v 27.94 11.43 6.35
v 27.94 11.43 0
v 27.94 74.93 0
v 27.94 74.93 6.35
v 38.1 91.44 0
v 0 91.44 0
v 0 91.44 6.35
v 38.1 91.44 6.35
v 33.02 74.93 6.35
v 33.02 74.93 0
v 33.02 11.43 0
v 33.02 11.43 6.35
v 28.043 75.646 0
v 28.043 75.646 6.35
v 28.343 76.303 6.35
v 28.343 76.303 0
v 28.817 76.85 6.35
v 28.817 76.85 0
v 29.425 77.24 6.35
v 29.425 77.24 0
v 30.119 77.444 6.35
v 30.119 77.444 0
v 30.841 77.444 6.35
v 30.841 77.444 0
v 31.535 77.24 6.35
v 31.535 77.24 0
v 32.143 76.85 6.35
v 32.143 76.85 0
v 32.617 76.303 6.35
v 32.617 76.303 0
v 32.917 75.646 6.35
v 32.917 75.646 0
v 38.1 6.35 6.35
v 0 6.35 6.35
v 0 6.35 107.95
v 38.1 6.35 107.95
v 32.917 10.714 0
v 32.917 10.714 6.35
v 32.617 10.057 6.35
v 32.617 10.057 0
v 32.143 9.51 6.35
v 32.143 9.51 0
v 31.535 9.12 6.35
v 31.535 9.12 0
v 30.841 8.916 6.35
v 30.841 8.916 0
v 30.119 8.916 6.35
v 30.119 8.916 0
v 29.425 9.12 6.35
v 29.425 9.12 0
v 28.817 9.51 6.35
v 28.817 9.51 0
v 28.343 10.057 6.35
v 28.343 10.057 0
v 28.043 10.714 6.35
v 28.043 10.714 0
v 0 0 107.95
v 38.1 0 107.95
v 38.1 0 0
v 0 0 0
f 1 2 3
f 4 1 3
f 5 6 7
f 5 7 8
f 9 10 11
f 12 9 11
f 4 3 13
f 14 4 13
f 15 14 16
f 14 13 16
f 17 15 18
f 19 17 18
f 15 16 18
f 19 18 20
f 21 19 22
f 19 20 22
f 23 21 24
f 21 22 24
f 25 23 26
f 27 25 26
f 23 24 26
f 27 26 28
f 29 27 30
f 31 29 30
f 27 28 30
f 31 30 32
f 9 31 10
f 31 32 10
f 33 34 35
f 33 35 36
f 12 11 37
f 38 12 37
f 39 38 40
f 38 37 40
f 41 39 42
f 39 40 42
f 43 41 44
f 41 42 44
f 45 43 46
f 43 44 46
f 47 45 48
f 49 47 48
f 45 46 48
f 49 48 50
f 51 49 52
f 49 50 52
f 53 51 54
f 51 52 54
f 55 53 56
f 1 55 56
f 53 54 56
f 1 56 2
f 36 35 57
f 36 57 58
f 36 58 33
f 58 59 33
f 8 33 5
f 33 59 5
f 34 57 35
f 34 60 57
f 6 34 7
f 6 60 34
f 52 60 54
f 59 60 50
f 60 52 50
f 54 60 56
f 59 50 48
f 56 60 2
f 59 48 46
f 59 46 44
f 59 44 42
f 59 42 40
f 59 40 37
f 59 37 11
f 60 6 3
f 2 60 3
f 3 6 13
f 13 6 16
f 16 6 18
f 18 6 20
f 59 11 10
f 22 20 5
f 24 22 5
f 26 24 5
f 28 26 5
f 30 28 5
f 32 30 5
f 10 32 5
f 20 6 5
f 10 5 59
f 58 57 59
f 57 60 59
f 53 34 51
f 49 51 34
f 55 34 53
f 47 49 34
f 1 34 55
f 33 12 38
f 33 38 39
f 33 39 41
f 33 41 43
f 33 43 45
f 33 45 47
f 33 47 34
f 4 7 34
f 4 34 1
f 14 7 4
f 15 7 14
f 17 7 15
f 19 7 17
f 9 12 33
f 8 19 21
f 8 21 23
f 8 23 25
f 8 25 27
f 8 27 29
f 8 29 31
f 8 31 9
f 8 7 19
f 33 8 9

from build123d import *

# Parameters (mm, degrees)
SKETCH1_W           = 38.1
SKETCH1_H           = 91.44
BOSS_EXTRUDE1_DEPTH = 6.35
SKETCH2_W           = 38.1
SKETCH2_H           = 6.35
BOSS_EXTRUDE2_DEPTH = 101.6


with BuildPart() as part:
    # Sketch1 → Boss-Extrude1 (new body)
    with BuildSketch(Plane.XY):
        with Locations((19.05, 45.72)):
            Rectangle(SKETCH1_W, SKETCH1_H)
        with BuildLine():
            Line((33.02, 74.93), (33.02, 11.43))
            ThreePointArc((33.02, 11.43), (30.48, 8.89), (27.94, 11.43))
            Line((27.94, 11.43), (27.94, 74.93))
            ThreePointArc((27.94, 74.93), (30.48, 77.47), (33.02, 74.93))
        make_face(mode=Mode.SUBTRACT)
    extrude(amount=BOSS_EXTRUDE1_DEPTH)

    # Sketch2 → Boss-Extrude2 (add)
    with BuildSketch(Plane.XY.offset(6.35)):
        with Locations((19.05, 3.175)):
            Rectangle(SKETCH2_W, SKETCH2_H)
    extrude(amount=BOSS_EXTRUDE2_DEPTH)


solid = part.part
